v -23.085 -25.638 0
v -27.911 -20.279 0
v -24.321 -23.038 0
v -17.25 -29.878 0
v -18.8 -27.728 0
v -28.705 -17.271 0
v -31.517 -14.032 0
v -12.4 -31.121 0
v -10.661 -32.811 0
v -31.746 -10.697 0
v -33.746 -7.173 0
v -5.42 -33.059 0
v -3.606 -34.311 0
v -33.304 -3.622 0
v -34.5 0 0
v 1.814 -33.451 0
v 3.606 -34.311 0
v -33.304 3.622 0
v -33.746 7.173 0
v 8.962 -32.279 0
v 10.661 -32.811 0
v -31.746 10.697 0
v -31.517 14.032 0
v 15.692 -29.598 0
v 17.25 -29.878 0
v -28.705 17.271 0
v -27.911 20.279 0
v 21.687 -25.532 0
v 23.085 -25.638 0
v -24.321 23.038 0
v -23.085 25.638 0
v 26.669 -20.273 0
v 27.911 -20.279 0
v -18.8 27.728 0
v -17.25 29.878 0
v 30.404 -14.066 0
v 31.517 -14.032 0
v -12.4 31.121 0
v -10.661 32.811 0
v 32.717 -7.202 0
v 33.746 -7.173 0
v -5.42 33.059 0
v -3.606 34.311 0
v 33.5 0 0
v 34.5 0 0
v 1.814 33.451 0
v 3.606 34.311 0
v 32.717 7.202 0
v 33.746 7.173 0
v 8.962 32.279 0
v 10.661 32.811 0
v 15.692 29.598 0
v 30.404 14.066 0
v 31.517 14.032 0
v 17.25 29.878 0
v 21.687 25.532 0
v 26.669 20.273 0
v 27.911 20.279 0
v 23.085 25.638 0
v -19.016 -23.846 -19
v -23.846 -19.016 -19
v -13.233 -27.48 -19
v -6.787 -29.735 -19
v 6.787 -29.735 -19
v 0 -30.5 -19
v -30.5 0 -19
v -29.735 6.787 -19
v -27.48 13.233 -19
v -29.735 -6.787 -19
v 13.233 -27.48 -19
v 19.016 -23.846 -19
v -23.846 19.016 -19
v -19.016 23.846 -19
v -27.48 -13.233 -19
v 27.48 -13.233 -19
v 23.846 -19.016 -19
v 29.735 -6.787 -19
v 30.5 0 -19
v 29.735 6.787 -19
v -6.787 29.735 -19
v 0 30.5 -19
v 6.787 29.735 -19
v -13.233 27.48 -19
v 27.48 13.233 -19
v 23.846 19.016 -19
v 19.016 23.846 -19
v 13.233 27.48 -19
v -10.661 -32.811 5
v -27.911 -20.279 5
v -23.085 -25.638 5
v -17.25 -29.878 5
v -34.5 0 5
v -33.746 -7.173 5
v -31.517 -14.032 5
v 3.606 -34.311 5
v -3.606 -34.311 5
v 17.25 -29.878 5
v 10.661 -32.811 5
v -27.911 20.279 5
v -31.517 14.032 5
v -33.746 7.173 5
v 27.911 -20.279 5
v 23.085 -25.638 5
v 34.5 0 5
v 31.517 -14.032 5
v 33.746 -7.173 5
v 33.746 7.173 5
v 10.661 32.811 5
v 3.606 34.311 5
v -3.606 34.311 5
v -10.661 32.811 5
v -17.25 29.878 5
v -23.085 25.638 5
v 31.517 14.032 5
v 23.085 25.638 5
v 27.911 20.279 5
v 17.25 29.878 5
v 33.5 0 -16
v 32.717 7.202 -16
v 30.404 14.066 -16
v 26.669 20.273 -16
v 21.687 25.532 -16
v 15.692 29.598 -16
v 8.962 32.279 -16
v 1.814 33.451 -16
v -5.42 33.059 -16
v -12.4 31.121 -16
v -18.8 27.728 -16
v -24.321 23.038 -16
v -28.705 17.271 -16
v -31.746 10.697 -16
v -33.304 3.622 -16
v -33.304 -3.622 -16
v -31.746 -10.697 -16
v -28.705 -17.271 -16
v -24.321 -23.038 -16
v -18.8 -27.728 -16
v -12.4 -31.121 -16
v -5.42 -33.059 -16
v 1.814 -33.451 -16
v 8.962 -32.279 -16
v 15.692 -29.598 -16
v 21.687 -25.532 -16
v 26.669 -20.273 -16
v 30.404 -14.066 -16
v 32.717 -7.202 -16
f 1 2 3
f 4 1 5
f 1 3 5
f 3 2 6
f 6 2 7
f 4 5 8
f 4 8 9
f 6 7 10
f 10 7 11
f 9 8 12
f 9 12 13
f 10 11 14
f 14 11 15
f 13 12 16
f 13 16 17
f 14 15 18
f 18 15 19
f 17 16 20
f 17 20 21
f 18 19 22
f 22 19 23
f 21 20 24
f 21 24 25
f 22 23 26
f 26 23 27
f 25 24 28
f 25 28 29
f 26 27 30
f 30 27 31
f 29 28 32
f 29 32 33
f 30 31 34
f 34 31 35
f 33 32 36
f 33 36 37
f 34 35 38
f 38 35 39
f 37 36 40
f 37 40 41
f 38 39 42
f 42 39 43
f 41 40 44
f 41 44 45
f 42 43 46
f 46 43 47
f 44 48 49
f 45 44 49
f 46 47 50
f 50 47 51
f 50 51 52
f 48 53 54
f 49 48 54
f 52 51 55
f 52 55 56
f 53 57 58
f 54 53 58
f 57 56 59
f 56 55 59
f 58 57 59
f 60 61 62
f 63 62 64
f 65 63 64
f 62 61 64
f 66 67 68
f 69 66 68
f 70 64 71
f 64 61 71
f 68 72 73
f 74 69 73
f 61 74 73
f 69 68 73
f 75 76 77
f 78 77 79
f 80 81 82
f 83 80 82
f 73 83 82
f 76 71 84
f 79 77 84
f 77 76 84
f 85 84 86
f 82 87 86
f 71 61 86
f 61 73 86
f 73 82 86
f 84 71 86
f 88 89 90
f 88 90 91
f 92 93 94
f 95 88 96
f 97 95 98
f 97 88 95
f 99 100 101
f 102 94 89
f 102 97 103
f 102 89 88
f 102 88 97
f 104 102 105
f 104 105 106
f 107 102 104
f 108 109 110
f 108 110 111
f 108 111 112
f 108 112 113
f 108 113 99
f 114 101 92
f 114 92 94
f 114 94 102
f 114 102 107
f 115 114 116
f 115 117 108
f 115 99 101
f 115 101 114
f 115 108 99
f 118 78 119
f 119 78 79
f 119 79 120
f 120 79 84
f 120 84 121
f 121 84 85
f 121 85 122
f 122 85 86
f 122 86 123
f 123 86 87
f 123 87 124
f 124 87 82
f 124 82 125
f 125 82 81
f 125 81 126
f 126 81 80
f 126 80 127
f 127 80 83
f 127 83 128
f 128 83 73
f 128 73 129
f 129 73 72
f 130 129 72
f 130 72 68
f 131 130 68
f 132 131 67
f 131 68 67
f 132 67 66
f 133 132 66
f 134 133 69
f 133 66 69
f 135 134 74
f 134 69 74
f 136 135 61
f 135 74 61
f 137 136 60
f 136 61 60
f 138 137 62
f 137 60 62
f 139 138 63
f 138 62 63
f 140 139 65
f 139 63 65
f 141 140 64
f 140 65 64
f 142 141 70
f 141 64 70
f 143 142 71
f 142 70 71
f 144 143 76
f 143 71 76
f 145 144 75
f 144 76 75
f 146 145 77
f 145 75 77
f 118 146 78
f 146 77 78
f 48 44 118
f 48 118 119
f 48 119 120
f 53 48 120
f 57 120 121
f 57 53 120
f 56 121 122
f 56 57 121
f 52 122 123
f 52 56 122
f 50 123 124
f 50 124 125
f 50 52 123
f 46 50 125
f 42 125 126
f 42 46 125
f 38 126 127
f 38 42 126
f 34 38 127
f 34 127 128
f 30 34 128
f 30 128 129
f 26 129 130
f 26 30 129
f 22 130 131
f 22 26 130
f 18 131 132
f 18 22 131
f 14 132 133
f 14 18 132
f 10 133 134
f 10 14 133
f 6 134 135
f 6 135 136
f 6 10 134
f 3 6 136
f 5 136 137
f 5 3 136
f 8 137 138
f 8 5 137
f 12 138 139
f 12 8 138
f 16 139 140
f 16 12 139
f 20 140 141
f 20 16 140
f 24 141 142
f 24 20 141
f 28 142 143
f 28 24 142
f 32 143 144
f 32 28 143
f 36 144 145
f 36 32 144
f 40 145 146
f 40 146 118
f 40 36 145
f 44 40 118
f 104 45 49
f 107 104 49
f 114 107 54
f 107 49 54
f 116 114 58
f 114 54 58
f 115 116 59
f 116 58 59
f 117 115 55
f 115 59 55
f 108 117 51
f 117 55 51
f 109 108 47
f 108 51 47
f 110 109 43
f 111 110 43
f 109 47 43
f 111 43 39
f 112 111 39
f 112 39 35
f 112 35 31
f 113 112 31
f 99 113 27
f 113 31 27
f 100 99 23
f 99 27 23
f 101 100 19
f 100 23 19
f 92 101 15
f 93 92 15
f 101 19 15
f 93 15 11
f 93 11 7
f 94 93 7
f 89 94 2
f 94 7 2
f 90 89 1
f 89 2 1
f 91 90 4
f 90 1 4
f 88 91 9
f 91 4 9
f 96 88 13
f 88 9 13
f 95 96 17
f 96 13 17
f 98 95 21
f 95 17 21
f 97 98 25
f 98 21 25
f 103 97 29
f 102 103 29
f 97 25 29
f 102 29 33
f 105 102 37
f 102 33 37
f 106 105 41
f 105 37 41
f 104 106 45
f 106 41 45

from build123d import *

# Parameters (mm, degrees)
F0_R     = 34.5
F0_R_2   = 34
F0_R_3   = 33.5
F1_DEPTH = 5
F2_DEPTH = 19
F4_SIZE  = 3


with BuildPart() as f1:
    # F0 (on Top) → F1 (new body)
    with BuildSketch(Plane.XY):
        Circle(F0_R)
        Circle(F0_R_2, mode=Mode.SUBTRACT)
        Circle(F0_R_2)
        Circle(F0_R_3, mode=Mode.SUBTRACT)
        Circle(F0_R_3)
    extrude(amount=F1_DEPTH)

    # F0 (on Top) → F2 (join)
    with BuildSketch(Plane.XY):
        Circle(F0_R_3)
    extrude(amount=-F2_DEPTH)

    # F4
    f4_edges = [f1.edges().sort_by_distance(p)[0] for p in [
        (-33.5, 0, -19),
    ]]
    chamfer(f4_edges, length=F4_SIZE)


solid = f1.part
